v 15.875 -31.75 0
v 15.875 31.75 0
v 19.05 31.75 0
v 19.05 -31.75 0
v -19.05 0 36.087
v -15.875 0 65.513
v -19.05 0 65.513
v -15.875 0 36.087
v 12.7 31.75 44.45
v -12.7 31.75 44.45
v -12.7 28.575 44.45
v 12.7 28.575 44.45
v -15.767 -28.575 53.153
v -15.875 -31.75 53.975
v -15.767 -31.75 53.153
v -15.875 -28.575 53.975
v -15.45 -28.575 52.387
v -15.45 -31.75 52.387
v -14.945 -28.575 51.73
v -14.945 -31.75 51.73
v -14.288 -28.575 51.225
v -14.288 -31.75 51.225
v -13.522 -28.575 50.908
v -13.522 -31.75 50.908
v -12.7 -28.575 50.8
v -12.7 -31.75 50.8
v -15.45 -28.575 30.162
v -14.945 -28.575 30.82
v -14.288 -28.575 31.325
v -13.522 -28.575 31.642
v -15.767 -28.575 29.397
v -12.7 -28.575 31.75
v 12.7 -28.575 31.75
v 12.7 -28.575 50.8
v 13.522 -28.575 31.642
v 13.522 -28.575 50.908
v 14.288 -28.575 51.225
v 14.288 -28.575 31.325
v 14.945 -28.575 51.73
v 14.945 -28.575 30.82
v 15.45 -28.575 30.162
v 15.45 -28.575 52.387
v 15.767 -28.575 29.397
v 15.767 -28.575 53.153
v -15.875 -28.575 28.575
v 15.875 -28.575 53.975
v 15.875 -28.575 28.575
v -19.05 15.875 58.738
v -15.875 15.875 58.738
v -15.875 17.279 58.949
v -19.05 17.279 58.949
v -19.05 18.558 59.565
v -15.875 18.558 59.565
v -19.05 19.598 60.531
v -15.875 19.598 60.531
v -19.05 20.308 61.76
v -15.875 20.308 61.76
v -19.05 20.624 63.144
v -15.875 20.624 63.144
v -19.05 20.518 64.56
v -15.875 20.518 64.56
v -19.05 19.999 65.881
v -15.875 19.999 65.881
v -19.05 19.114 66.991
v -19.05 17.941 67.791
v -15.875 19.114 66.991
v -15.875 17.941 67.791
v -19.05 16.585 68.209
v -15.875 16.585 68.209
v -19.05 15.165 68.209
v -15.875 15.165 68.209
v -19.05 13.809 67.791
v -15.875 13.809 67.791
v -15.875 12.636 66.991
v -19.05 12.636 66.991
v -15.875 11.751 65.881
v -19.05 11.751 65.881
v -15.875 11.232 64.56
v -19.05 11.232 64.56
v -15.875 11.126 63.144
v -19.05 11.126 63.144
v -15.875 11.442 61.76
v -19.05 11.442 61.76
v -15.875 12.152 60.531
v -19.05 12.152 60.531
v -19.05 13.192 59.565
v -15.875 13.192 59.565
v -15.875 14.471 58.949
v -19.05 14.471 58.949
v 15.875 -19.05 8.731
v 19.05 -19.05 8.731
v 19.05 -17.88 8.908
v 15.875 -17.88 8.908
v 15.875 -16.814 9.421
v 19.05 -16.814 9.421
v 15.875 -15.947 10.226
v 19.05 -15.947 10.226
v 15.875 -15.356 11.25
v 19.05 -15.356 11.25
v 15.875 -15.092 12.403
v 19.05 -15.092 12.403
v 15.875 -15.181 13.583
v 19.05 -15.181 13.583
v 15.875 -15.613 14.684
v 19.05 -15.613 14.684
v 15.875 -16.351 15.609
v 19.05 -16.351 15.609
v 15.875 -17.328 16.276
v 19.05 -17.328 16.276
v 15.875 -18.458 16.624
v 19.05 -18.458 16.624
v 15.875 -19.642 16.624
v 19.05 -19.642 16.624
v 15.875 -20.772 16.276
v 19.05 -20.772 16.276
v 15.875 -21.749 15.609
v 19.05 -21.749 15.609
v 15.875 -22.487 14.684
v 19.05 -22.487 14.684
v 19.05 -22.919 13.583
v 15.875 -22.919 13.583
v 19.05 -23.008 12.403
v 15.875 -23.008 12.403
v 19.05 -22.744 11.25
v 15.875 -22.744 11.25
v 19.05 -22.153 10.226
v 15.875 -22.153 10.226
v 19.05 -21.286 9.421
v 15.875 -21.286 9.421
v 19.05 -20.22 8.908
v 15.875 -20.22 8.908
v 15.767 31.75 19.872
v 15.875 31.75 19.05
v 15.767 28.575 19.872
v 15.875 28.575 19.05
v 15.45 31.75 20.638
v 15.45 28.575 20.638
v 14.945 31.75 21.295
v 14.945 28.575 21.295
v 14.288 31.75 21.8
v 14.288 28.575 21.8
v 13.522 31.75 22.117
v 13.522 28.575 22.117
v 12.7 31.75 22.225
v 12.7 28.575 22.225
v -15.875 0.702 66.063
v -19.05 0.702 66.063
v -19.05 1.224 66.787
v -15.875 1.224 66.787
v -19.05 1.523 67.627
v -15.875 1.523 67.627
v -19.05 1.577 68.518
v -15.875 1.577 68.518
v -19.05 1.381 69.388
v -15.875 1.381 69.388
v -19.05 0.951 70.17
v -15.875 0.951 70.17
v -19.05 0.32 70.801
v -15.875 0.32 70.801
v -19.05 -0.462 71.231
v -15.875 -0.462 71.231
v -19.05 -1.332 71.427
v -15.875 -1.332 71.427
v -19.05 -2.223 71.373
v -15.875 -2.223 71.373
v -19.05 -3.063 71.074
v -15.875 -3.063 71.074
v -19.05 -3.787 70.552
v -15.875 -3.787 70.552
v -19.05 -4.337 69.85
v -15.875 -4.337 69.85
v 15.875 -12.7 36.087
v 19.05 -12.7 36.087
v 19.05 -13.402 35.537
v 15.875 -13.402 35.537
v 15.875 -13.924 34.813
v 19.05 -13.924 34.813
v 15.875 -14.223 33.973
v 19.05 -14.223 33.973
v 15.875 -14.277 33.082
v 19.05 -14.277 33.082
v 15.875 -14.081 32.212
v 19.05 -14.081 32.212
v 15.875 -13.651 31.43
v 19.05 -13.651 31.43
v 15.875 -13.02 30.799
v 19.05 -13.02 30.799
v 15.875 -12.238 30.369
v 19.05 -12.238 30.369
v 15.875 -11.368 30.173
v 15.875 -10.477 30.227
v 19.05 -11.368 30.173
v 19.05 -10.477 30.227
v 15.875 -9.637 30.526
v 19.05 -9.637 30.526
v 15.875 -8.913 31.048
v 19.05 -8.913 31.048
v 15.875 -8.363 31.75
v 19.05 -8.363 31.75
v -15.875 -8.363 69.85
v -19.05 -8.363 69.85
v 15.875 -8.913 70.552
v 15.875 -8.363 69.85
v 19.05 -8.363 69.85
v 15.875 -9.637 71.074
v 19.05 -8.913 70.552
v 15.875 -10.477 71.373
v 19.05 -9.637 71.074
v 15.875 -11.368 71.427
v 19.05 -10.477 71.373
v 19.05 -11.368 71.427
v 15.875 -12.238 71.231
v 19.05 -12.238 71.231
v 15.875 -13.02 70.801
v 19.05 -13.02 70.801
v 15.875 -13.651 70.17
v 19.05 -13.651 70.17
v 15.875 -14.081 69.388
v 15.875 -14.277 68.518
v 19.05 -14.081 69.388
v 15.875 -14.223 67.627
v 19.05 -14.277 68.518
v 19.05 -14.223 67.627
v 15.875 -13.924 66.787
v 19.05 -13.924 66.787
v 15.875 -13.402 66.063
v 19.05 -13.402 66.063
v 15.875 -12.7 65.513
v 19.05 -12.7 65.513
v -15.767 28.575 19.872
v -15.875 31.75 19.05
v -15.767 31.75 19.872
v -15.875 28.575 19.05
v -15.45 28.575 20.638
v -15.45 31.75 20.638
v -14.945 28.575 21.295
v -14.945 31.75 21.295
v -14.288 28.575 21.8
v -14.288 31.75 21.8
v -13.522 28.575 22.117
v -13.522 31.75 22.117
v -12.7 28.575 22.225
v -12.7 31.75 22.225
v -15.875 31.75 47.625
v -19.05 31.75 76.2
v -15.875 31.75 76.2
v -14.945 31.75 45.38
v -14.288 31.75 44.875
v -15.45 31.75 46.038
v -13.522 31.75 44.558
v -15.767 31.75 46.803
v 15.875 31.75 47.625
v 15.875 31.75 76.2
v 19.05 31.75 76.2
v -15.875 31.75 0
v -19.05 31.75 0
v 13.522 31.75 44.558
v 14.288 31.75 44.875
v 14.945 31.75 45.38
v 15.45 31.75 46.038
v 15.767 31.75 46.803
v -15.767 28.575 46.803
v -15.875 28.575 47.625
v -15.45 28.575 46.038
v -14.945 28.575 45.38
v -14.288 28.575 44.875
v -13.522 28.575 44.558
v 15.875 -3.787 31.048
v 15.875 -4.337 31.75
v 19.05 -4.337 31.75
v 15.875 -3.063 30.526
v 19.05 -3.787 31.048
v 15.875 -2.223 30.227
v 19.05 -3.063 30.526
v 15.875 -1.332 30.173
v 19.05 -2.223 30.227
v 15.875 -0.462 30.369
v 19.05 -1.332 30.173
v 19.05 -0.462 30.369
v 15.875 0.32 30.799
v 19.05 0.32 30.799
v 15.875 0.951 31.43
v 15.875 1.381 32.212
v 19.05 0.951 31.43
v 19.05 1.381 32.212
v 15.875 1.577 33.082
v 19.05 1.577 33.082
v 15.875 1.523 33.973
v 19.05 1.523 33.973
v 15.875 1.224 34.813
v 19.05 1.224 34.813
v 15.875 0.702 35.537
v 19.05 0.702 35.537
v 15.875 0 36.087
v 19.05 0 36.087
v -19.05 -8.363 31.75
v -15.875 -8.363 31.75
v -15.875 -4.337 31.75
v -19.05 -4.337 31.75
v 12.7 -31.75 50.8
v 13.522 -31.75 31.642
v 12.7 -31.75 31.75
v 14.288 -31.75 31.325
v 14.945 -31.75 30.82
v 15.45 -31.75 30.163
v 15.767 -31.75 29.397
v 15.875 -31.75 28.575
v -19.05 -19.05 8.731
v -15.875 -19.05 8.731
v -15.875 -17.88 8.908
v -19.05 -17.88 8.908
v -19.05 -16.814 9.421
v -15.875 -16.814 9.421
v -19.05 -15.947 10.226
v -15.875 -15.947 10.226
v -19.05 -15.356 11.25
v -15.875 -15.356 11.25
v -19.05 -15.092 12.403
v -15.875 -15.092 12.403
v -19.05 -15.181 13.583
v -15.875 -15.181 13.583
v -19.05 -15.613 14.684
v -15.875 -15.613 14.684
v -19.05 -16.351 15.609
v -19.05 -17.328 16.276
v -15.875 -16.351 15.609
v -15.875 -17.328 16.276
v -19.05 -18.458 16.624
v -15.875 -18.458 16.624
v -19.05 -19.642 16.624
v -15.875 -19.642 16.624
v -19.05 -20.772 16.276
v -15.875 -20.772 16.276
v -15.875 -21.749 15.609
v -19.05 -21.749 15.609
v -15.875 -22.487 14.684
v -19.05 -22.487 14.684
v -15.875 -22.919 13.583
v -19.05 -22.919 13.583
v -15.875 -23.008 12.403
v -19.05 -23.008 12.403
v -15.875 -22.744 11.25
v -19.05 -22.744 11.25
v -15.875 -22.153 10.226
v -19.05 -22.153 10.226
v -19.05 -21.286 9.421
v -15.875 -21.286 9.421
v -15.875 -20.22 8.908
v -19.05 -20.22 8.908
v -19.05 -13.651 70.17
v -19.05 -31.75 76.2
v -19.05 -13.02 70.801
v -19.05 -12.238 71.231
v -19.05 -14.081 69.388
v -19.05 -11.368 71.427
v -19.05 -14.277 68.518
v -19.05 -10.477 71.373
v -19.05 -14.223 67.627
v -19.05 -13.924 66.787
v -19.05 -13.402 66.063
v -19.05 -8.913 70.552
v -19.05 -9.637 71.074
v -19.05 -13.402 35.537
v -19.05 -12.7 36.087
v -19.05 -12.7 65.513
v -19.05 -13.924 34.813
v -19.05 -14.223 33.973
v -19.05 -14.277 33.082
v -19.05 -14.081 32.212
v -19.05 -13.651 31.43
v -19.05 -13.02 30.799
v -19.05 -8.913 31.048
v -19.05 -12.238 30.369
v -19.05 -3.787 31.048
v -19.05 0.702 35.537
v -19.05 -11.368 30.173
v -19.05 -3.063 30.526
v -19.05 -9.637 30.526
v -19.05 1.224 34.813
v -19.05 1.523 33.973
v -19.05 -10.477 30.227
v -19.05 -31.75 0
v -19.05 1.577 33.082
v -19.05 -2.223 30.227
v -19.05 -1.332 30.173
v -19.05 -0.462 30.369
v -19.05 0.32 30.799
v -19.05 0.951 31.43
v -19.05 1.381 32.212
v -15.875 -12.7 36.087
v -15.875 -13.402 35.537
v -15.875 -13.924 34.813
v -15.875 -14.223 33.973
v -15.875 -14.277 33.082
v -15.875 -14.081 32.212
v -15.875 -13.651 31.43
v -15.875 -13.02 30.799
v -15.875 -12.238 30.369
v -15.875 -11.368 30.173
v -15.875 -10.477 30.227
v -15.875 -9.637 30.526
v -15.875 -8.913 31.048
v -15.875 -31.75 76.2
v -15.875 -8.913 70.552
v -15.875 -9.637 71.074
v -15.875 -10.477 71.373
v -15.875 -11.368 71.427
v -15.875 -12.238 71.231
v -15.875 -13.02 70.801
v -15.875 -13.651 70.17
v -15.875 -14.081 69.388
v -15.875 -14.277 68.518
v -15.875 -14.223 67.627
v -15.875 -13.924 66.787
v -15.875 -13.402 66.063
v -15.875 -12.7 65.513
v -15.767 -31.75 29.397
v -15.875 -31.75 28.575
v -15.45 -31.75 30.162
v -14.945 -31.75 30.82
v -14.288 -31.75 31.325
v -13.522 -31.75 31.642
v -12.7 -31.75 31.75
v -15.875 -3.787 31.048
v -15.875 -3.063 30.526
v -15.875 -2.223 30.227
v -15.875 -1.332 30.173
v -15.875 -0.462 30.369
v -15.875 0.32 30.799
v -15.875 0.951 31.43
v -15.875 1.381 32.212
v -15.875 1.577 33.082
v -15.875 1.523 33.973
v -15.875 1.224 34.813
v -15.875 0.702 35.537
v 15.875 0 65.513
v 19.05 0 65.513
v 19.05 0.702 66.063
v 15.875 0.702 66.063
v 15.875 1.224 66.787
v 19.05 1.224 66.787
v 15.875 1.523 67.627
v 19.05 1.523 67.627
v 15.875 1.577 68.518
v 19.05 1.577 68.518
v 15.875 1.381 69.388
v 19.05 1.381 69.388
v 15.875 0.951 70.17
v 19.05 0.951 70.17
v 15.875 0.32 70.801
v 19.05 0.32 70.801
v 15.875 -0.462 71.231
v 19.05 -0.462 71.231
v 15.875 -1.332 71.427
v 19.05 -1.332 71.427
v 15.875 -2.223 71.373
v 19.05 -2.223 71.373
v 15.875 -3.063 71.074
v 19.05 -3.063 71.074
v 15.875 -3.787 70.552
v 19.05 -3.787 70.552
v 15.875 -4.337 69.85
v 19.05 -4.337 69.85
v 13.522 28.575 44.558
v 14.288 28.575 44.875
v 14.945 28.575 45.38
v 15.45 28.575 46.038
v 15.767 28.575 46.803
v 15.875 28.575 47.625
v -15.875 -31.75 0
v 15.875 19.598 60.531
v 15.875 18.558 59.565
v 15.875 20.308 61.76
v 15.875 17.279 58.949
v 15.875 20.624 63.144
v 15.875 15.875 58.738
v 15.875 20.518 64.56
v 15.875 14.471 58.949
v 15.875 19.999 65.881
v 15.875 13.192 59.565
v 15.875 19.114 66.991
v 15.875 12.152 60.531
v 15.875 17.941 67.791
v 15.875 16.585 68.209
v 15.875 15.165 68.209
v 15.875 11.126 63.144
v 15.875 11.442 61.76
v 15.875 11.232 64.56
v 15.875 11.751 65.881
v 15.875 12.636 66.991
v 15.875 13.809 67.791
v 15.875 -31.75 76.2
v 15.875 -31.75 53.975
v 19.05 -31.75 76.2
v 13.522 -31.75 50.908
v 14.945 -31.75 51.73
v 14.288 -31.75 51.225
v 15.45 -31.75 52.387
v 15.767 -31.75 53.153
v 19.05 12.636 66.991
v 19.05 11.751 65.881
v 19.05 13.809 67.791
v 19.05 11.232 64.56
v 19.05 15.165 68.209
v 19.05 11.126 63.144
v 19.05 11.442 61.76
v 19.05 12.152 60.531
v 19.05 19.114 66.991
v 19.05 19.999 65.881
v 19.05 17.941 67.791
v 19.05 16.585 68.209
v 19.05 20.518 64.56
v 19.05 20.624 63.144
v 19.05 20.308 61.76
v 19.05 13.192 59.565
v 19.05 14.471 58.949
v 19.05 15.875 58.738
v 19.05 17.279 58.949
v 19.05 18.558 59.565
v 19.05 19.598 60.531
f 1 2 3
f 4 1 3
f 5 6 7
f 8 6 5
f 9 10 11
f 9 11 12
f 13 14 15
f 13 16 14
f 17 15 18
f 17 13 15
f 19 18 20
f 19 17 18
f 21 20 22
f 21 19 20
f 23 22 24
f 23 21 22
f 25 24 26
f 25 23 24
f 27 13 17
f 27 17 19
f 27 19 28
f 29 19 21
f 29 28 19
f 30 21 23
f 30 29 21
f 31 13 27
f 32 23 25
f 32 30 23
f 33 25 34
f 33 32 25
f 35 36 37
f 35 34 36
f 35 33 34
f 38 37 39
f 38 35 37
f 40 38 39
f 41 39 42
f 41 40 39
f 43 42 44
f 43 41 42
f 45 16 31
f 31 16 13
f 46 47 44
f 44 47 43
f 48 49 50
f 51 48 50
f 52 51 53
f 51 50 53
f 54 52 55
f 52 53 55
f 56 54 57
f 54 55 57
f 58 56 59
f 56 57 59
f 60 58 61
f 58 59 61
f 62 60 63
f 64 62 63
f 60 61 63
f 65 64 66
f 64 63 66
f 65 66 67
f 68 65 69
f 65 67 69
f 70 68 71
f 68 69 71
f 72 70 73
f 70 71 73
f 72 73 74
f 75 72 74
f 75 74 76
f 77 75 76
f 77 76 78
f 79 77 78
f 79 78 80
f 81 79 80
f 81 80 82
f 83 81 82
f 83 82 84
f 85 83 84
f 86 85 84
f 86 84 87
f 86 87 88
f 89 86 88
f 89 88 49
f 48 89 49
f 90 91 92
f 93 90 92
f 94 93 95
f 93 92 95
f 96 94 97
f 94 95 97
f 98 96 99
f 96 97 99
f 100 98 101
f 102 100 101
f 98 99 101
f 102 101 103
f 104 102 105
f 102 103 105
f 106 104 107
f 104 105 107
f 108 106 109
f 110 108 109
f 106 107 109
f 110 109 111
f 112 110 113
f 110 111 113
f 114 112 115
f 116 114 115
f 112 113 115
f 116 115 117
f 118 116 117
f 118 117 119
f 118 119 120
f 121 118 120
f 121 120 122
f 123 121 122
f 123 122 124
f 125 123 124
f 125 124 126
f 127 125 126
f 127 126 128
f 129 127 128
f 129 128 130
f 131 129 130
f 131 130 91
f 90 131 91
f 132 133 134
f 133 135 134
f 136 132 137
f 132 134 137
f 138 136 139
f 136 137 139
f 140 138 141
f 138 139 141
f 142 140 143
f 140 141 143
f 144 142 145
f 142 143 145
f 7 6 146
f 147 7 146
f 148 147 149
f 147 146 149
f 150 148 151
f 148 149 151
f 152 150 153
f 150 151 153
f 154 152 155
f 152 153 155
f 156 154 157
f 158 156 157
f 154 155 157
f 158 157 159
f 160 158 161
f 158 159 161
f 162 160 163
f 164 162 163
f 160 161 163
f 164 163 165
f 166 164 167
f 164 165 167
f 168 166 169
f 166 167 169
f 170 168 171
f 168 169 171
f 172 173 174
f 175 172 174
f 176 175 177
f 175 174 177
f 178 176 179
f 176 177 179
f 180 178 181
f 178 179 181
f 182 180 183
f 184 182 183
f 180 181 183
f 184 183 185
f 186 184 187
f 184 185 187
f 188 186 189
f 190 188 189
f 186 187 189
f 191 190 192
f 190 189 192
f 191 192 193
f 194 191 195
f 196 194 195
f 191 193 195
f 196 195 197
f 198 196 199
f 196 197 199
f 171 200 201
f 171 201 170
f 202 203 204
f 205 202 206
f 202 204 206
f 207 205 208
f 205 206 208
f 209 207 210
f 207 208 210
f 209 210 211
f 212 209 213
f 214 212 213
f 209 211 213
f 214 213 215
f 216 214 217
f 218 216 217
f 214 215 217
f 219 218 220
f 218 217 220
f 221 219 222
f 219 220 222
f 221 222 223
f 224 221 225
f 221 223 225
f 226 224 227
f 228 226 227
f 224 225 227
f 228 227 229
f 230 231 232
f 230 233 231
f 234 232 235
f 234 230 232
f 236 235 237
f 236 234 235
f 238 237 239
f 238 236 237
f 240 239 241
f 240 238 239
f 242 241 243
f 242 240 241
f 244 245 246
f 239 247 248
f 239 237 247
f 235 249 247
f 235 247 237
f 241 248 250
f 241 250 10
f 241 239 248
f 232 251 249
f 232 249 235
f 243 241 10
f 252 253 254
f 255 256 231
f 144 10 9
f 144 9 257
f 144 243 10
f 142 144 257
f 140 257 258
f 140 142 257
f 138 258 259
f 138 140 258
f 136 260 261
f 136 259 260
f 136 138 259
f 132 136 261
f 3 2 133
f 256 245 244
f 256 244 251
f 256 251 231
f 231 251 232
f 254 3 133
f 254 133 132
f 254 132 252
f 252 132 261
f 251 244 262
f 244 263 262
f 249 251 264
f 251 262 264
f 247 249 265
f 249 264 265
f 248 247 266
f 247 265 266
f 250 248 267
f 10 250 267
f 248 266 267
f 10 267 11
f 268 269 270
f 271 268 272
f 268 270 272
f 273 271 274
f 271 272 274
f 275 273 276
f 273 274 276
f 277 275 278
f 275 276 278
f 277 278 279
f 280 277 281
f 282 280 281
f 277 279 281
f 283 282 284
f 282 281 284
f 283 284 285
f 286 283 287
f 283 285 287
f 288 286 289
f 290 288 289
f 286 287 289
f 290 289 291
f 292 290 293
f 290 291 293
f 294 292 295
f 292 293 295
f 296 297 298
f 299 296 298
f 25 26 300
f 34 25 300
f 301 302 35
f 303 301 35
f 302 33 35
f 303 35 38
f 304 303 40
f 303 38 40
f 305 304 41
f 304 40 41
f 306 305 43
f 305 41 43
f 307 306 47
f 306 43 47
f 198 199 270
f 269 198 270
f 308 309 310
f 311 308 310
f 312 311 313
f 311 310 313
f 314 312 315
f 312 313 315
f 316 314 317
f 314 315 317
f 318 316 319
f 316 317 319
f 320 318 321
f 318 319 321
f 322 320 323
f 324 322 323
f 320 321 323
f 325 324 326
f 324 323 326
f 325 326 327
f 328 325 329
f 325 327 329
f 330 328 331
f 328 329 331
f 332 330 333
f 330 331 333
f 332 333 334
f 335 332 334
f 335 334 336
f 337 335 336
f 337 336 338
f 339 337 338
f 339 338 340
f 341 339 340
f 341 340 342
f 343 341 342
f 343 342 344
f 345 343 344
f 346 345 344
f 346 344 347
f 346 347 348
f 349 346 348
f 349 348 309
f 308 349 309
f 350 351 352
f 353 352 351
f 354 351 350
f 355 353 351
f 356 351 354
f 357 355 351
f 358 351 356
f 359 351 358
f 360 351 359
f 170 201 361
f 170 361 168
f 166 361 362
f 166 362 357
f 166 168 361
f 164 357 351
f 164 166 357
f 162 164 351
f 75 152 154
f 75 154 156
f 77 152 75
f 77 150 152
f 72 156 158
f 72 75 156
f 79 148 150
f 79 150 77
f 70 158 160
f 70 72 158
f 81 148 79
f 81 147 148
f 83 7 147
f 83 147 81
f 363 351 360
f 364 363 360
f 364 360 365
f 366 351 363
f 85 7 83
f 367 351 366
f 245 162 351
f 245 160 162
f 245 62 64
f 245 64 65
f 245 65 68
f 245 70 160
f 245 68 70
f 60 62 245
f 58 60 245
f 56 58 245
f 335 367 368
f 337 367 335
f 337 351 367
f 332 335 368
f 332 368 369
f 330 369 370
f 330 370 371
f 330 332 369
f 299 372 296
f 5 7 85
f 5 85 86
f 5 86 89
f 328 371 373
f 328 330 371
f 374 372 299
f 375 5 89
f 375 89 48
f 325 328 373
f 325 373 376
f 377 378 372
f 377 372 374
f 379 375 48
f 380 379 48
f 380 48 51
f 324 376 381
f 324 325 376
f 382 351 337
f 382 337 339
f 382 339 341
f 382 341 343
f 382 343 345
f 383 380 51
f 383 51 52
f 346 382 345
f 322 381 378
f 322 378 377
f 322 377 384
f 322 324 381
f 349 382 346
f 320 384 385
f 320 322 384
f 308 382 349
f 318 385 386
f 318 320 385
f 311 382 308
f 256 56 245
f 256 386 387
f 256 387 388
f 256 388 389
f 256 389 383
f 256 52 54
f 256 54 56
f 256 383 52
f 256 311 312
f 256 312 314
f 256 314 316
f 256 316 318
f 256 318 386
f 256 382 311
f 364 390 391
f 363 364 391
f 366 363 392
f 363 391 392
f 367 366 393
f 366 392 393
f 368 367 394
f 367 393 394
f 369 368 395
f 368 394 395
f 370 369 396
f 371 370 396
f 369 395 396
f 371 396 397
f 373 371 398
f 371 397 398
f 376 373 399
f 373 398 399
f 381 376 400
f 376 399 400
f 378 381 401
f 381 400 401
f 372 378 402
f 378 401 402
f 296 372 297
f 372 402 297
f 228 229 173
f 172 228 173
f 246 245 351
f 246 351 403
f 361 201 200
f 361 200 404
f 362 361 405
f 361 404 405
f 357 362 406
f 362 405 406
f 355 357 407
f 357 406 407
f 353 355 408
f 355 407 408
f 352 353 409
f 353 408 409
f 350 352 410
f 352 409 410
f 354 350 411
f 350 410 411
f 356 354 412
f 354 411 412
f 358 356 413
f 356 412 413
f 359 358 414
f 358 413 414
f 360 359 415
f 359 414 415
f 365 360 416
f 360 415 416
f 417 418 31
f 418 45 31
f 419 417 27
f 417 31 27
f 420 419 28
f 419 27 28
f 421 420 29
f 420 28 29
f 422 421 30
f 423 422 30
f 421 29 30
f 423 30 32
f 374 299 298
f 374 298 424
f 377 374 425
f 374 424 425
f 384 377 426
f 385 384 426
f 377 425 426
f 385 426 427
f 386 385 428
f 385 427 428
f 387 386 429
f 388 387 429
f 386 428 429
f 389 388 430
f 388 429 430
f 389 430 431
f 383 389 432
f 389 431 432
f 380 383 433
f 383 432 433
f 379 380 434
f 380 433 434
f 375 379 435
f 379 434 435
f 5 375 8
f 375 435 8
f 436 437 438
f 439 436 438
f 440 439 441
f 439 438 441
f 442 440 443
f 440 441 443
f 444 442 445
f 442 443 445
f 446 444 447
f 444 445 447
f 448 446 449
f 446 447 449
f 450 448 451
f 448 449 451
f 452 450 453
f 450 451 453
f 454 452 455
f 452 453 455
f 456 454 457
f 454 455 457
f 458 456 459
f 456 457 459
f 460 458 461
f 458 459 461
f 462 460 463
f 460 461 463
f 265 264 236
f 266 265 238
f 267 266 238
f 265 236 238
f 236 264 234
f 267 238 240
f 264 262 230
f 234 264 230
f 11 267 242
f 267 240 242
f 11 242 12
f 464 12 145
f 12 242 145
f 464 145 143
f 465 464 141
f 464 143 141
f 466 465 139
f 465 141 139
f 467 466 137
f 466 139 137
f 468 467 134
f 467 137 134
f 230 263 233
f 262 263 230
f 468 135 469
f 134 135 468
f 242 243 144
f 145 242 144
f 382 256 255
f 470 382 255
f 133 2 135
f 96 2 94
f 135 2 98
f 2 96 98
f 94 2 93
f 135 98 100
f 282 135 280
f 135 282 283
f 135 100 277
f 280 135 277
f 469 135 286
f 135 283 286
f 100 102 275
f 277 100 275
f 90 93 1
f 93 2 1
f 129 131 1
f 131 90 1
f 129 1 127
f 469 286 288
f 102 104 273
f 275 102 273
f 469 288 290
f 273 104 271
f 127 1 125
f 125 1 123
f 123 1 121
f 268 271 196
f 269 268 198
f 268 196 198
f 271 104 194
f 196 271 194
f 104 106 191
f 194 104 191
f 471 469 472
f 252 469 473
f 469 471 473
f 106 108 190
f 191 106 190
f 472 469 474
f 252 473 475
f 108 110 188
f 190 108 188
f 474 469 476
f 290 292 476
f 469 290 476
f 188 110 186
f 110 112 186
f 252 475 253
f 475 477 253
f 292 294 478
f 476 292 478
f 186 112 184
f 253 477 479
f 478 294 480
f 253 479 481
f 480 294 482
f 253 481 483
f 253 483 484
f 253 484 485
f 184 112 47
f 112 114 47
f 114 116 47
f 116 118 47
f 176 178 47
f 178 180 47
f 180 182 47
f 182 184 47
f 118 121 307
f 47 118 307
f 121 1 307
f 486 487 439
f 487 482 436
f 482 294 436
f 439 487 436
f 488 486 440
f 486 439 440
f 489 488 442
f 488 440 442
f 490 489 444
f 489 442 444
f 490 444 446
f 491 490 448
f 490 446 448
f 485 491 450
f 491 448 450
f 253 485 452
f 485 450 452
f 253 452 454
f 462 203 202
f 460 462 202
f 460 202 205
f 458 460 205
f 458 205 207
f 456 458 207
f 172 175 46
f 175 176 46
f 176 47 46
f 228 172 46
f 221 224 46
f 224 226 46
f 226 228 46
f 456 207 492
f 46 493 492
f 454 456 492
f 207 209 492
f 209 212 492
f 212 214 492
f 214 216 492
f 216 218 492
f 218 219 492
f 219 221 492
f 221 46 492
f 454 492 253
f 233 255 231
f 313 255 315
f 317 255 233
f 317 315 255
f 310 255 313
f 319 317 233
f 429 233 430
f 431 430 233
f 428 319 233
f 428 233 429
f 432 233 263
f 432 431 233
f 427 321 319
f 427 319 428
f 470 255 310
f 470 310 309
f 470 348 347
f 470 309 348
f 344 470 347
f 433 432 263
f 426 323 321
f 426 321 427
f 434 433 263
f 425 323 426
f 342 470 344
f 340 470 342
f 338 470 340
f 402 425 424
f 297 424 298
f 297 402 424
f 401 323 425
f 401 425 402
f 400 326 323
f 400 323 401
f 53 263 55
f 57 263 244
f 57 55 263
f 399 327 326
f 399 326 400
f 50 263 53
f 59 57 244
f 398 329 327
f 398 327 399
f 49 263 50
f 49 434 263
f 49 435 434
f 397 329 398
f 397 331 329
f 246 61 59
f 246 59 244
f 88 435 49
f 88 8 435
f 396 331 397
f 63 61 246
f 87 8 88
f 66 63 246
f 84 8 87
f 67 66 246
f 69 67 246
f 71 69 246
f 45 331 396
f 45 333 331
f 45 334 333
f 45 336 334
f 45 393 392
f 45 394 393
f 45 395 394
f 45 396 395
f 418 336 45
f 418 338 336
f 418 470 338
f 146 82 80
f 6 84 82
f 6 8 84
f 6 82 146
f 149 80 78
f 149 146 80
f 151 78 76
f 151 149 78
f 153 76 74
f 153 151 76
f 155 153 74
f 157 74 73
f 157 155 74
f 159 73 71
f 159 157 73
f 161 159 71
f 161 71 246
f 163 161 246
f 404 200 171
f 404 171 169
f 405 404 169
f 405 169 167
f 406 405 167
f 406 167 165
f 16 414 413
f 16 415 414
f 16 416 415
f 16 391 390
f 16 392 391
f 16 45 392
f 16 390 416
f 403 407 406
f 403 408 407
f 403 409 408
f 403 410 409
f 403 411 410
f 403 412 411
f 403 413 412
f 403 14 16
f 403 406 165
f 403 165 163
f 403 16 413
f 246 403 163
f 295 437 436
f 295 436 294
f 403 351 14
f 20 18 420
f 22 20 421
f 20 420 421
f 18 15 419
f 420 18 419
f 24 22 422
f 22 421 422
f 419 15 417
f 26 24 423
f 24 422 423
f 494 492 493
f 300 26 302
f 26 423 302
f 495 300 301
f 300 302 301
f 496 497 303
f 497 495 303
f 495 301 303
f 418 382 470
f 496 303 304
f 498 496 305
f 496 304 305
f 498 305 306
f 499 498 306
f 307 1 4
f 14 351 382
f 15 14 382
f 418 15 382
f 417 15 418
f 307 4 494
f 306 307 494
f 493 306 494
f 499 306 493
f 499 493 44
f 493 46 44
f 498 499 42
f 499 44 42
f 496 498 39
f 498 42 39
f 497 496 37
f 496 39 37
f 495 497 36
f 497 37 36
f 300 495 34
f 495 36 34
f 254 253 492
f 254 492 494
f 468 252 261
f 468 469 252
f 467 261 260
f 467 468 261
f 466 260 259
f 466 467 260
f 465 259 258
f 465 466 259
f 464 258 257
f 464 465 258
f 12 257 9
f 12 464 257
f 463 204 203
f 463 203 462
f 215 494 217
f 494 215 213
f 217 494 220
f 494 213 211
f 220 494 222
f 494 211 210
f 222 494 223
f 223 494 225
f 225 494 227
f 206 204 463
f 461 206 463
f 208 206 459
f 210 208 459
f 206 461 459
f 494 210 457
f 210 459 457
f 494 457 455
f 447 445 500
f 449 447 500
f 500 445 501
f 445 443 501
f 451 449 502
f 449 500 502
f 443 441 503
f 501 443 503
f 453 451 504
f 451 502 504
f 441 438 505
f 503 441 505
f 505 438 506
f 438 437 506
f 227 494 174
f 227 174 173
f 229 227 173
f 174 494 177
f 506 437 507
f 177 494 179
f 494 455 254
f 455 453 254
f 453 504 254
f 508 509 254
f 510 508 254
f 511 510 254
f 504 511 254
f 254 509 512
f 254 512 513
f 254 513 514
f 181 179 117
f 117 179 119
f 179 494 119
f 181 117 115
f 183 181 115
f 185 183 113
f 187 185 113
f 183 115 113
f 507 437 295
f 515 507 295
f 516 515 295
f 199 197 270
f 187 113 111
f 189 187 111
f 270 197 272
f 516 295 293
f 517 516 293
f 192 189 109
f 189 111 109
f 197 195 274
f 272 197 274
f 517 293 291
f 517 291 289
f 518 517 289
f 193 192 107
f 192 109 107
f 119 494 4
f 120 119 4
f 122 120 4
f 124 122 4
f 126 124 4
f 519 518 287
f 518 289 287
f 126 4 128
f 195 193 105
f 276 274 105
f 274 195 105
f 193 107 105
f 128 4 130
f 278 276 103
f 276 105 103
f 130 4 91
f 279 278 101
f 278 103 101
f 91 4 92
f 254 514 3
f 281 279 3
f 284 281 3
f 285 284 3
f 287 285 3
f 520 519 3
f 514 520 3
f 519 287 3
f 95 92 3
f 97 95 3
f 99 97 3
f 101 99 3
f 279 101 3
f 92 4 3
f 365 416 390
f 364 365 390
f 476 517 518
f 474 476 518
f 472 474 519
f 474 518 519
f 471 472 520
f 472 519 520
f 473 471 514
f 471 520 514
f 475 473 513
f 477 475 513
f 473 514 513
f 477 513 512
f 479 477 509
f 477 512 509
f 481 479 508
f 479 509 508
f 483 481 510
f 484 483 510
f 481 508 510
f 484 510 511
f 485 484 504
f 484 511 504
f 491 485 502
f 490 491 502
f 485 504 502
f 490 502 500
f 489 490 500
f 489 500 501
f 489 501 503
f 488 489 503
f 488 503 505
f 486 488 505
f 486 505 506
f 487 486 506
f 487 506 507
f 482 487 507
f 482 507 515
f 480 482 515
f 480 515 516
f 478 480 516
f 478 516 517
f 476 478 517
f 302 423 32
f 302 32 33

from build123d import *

# Parameters (mm, degrees)
SKETCH1_W           = 38.1
SKETCH1_H           = 63.5
SKETCH1_W_2         = 31.75
SKETCH1_H_2         = 57.15
BOSS_EXTRUDE1_DEPTH = 76.2
SKETCH2_R           = 3.175
SKETCH2_W           = 38.1
SKETCH2_H           = 12.7
SKETCH2_R_2         = 4.7625
SKETCH2_R_3         = 3.96875
CUT_EXTRUDE1_DEPTH  = 39.1
CUT_EXTRUDE2_REACH  = 65.5
SKETCH3_W           = 31.75
SKETCH3_H           = 31.75
SKETCH3_H_2         = 22.225
CUT_EXTRUDE3_REACH  = 65.5
SKETCH4_W           = 31.75
SKETCH4_H           = 31.75
SKETCH4_H_2         = 25.4
FILLET1_R           = 3.175


with BuildPart() as part:
    # Sketch1 → Boss-Extrude1 (new body)
    with BuildSketch(Plane.XY):
        Rectangle(SKETCH1_W, SKETCH1_H)
        Rectangle(SKETCH1_W_2, SKETCH1_H_2, mode=Mode.SUBTRACT)
    extrude(amount=BOSS_EXTRUDE1_DEPTH)

    # Sketch2 → Cut-Extrude1 (cut, through all)
    with BuildSketch(Plane(origin=(19.05, 0, 0), x_dir=(0, 0, -1), z_dir=(1, 0, 0))):
        with Locations((-33.3375, -1.5875)):
            Circle(SKETCH2_R)
        with Locations((-68.2625, -1.5875)):
            Circle(SKETCH2_R)
        with Locations((-68.2625, -11.1125)):
            Circle(SKETCH2_R)
        with Locations((-33.3375, -11.1125)):
            Circle(SKETCH2_R)
        with Locations((-50.8, -6.35)):
            Rectangle(SKETCH2_W, SKETCH2_H)
        with BuildLine():
            ThreePointArc((-65.512869343, 0), (-70.50756403, 0.65756403), (-69.85, -4.337130657))
            Line((-69.85, -4.337130657), (-69.85, 0))
            Line((-69.85, 0), (-65.512869343, 0))
        make_face()
        with BuildLine():
            Line((-69.85, 0), (-69.85, -4.337130657))
            ThreePointArc((-69.85, -4.337130657), (-66.675, -4.337130657), (-65.0875, -1.5875))
            ThreePointArc((-65.0875, -1.5875), (-65.195685502, -0.765749532), (-65.512869343, 0))
            Line((-65.512869343, 0), (-69.85, 0))
        make_face()
        with BuildLine():
            ThreePointArc((-36.087130657, 0), (-35.58256403, -3.83256403), (-31.75, -4.337130657))
            Line((-31.75, -4.337130657), (-31.75, 0))
            Line((-31.75, 0), (-36.087130657, 0))
        make_face()
        with BuildLine():
            Line((-31.75, 0), (-31.75, -4.337130657))
            ThreePointArc((-31.75, -4.337130657), (-30.587869343, -3.175), (-30.1625, -1.5875))
            ThreePointArc((-30.1625, -1.5875), (-32.515749532, 1.479314498), (-36.087130657, 0))
            Line((-36.087130657, 0), (-31.75, 0))
        make_face()
        with BuildLine():
            ThreePointArc((-31.75, -8.362869343), (-35.58256403, -8.86743597), (-36.087130657, -12.7))
            Line((-36.087130657, -12.7), (-31.75, -12.7))
            Line((-31.75, -12.7), (-31.75, -8.362869343))
        make_face()
        with BuildLine():
            Line((-31.75, -12.7), (-36.087130657, -12.7))
            ThreePointArc((-36.087130657, -12.7), (-32.515749532, -14.179314498), (-30.1625, -11.1125))
            ThreePointArc((-30.1625, -11.1125), (-30.587869343, -9.525), (-31.75, -8.362869343))
            Line((-31.75, -8.362869343), (-31.75, -12.7))
        make_face()
        with BuildLine():
            Line((-69.85, -8.362869343), (-69.85, -12.7))
            Line((-69.85, -12.7), (-65.512869343, -12.7))
            ThreePointArc((-65.512869343, -12.7), (-65.195685502, -11.934250468), (-65.0875, -11.1125))
            ThreePointArc((-65.0875, -11.1125), (-66.675, -8.362869343), (-69.85, -8.362869343))
        make_face()
        with BuildLine():
            Line((-65.512869343, -12.7), (-69.85, -12.7))
            Line((-69.85, -12.7), (-69.85, -8.362869343))
            ThreePointArc((-69.85, -8.362869343), (-70.50756403, -13.35756403), (-65.512869343, -12.7))
        make_face()
        with Locations((-63.5, 15.875)):
            Circle(SKETCH2_R_2)
        with Locations((-12.7, -19.05)):
            Circle(SKETCH2_R_3)
    extrude(amount=-CUT_EXTRUDE1_DEPTH, mode=Mode.SUBTRACT)

    # Sketch3 → Cut-Extrude2 (cut, up to next)
    with BuildSketch(Plane(origin=(0, 31.75, 0), x_dir=(1, 0, 0), z_dir=(0, 1, 0)), mode=Mode.PRIVATE) as cut_extrude2_sk1:
        with Locations((0, -60.325)):
            Rectangle(SKETCH3_W, SKETCH3_H)
    cut_extrude2_tool1 = extrude(cut_extrude2_sk1.sketch, amount=-CUT_EXTRUDE2_REACH, mode=Mode.PRIVATE) & part.part
    add(cut_extrude2_tool1.solids().sort_by_distance((0, 31.75, 60.325))[0], mode=Mode.SUBTRACT)
    # Sketch3 → Cut-Extrude2 (cut, up to next)
    with BuildSketch(Plane(origin=(0, 31.75, 0), x_dir=(1, 0, 0), z_dir=(0, 1, 0)), mode=Mode.PRIVATE) as cut_extrude2_sk2:
        with Locations((0, -11.1125)):
            Rectangle(SKETCH3_W, SKETCH3_H_2)
    cut_extrude2_tool2 = extrude(cut_extrude2_sk2.sketch, amount=-CUT_EXTRUDE2_REACH, mode=Mode.PRIVATE) & part.part
    add(cut_extrude2_tool2.solids().sort_by_distance((0, 31.75, 11.1125))[0], mode=Mode.SUBTRACT)

    # Sketch4 → Cut-Extrude3 (cut, up to next)
    with BuildSketch(Plane.XZ.offset(31.75), mode=Mode.PRIVATE) as cut_extrude3_sk1:
        with Locations((0, 15.875)):
            Rectangle(SKETCH4_W, SKETCH4_H)
    cut_extrude3_tool1 = extrude(cut_extrude3_sk1.sketch, amount=-CUT_EXTRUDE3_REACH, mode=Mode.PRIVATE) & part.part
    add(cut_extrude3_tool1.solids().sort_by_distance((0, -31.75, 15.875))[0], mode=Mode.SUBTRACT)
    # Sketch4 → Cut-Extrude3 (cut, up to next)
    with BuildSketch(Plane.XZ.offset(31.75), mode=Mode.PRIVATE) as cut_extrude3_sk2:
        with Locations((0, 63.5)):
            Rectangle(SKETCH4_W, SKETCH4_H_2)
    cut_extrude3_tool2 = extrude(cut_extrude3_sk2.sketch, amount=-CUT_EXTRUDE3_REACH, mode=Mode.PRIVATE) & part.part
    add(cut_extrude3_tool2.solids().sort_by_distance((0, -31.75, 63.5))[0], mode=Mode.SUBTRACT)

    # Fillet1
    fillet1_edges = [part.edges().sort_by_distance(p)[0] for p in [
        (15.875, 30.1625, 44.45),
        (-15.875, 30.1625, 44.45),
        (15.875, 30.1625, 22.225),
        (-15.875, 30.1625, 22.225),
        (-15.875, -30.1625, 31.75),
        (15.875, -30.1625, 31.75),
        (-15.875, -30.1625, 50.8),
        (15.875, -30.1625, 50.8),
    ]]
    fillet(fillet1_edges, radius=FILLET1_R)


solid = part.part
